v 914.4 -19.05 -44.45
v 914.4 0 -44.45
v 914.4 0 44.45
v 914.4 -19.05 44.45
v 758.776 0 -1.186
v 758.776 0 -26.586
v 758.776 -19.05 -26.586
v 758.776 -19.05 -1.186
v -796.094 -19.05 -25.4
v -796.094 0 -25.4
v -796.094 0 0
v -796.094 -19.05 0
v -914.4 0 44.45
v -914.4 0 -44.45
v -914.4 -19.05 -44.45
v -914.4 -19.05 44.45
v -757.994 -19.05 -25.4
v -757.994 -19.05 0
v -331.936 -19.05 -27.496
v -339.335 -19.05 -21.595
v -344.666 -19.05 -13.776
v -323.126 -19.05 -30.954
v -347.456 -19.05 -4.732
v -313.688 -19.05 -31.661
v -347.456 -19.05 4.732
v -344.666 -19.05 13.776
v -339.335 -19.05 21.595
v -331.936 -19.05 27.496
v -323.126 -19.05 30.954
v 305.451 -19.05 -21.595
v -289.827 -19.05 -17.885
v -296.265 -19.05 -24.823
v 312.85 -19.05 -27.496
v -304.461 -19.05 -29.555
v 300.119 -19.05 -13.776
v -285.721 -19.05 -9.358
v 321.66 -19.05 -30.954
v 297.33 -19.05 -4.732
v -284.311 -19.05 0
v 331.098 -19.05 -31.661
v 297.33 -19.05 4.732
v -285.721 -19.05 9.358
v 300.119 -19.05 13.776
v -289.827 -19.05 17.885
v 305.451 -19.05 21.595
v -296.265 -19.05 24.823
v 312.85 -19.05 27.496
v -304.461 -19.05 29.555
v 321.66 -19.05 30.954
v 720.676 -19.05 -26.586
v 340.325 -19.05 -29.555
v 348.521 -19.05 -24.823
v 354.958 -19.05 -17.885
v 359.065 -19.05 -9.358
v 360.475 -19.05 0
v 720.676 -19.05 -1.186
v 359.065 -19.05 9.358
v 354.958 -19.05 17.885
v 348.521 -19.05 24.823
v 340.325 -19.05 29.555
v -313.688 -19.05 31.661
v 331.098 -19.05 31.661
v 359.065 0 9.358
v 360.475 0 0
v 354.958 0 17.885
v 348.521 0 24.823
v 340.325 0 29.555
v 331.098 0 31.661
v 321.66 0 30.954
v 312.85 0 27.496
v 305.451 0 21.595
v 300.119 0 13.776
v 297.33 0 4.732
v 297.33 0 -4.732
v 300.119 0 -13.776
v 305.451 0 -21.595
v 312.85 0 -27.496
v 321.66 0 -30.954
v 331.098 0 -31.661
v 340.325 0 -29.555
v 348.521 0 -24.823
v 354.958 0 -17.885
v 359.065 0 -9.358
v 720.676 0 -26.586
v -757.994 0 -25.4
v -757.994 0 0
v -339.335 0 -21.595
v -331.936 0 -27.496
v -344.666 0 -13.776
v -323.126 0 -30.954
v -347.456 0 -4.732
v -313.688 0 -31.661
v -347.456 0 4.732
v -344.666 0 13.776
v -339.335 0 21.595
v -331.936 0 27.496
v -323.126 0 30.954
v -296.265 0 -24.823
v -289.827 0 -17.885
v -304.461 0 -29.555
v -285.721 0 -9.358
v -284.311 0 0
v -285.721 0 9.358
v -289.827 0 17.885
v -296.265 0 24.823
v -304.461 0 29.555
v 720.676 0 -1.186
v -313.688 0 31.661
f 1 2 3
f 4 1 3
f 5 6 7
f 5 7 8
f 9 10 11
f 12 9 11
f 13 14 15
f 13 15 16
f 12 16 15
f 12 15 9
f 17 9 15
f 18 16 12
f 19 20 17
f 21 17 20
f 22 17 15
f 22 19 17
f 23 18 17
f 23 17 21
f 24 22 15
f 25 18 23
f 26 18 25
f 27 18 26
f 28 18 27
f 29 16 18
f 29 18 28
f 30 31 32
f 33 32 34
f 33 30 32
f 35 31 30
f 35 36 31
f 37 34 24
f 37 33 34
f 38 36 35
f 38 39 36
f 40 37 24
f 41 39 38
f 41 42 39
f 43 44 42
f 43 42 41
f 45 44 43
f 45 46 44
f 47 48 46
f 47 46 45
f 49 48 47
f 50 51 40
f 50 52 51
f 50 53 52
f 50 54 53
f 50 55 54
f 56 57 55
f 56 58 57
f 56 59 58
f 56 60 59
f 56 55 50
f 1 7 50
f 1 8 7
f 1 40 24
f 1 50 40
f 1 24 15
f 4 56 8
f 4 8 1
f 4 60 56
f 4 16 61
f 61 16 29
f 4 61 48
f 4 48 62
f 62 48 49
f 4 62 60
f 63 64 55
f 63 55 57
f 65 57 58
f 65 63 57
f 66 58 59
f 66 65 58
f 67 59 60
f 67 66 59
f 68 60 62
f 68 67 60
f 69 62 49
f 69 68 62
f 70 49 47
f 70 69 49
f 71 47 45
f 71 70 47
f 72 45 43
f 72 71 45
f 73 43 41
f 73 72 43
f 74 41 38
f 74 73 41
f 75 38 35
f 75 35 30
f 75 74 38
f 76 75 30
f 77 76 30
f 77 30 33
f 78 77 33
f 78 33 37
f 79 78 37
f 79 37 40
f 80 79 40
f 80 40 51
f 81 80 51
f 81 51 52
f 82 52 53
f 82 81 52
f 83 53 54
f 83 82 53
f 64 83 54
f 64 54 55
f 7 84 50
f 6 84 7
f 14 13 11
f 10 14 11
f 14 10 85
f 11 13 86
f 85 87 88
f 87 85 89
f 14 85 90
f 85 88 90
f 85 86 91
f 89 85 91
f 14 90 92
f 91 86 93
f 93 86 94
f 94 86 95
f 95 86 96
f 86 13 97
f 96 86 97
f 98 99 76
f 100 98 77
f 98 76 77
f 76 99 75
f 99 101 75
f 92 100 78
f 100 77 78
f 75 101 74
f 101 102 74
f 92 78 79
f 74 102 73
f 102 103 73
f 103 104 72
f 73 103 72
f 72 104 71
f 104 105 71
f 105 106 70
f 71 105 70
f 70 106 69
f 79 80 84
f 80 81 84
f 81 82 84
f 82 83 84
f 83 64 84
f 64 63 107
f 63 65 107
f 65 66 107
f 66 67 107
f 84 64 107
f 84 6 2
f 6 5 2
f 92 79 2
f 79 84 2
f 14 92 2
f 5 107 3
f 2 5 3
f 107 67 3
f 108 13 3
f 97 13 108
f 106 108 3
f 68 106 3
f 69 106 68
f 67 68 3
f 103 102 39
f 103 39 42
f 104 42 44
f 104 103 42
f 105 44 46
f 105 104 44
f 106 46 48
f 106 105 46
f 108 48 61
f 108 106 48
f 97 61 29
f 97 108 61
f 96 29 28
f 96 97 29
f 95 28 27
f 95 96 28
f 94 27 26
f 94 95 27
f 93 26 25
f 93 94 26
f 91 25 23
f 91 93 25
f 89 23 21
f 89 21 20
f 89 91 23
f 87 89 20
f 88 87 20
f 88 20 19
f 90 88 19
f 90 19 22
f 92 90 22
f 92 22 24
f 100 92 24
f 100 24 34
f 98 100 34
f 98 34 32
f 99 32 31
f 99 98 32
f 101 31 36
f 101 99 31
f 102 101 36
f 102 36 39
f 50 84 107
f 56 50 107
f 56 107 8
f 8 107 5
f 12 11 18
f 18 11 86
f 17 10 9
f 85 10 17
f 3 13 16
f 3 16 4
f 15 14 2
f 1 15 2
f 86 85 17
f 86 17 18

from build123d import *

# Parameters (mm, degrees)
F0_W     = 1828.8
F0_H     = 88.9
F0_W_2   = 38.1
F0_H_2   = 25.4
F0_R     = 31.75
F1_DEPTH = 19.05


with BuildPart() as f1:
    # F0 (on Front) → F1 (new body)
    with BuildSketch(Plane.XZ):
        Rectangle(F0_W, F0_H)
        with Locations((-777.044298, -12.7)):
            Rectangle(F0_W_2, F0_H_2, mode=Mode.SUBTRACT)
        with Locations((739.726365, -13.886383)):
            Rectangle(F0_W_2, F0_H_2, mode=Mode.SUBTRACT)
        with Locations((-316.060573, 0)):
            Circle(F0_R, mode=Mode.SUBTRACT)
        with Locations((328.7251, 0)):
            Circle(F0_R, mode=Mode.SUBTRACT)
    extrude(amount=F1_DEPTH)


solid = f1.part
